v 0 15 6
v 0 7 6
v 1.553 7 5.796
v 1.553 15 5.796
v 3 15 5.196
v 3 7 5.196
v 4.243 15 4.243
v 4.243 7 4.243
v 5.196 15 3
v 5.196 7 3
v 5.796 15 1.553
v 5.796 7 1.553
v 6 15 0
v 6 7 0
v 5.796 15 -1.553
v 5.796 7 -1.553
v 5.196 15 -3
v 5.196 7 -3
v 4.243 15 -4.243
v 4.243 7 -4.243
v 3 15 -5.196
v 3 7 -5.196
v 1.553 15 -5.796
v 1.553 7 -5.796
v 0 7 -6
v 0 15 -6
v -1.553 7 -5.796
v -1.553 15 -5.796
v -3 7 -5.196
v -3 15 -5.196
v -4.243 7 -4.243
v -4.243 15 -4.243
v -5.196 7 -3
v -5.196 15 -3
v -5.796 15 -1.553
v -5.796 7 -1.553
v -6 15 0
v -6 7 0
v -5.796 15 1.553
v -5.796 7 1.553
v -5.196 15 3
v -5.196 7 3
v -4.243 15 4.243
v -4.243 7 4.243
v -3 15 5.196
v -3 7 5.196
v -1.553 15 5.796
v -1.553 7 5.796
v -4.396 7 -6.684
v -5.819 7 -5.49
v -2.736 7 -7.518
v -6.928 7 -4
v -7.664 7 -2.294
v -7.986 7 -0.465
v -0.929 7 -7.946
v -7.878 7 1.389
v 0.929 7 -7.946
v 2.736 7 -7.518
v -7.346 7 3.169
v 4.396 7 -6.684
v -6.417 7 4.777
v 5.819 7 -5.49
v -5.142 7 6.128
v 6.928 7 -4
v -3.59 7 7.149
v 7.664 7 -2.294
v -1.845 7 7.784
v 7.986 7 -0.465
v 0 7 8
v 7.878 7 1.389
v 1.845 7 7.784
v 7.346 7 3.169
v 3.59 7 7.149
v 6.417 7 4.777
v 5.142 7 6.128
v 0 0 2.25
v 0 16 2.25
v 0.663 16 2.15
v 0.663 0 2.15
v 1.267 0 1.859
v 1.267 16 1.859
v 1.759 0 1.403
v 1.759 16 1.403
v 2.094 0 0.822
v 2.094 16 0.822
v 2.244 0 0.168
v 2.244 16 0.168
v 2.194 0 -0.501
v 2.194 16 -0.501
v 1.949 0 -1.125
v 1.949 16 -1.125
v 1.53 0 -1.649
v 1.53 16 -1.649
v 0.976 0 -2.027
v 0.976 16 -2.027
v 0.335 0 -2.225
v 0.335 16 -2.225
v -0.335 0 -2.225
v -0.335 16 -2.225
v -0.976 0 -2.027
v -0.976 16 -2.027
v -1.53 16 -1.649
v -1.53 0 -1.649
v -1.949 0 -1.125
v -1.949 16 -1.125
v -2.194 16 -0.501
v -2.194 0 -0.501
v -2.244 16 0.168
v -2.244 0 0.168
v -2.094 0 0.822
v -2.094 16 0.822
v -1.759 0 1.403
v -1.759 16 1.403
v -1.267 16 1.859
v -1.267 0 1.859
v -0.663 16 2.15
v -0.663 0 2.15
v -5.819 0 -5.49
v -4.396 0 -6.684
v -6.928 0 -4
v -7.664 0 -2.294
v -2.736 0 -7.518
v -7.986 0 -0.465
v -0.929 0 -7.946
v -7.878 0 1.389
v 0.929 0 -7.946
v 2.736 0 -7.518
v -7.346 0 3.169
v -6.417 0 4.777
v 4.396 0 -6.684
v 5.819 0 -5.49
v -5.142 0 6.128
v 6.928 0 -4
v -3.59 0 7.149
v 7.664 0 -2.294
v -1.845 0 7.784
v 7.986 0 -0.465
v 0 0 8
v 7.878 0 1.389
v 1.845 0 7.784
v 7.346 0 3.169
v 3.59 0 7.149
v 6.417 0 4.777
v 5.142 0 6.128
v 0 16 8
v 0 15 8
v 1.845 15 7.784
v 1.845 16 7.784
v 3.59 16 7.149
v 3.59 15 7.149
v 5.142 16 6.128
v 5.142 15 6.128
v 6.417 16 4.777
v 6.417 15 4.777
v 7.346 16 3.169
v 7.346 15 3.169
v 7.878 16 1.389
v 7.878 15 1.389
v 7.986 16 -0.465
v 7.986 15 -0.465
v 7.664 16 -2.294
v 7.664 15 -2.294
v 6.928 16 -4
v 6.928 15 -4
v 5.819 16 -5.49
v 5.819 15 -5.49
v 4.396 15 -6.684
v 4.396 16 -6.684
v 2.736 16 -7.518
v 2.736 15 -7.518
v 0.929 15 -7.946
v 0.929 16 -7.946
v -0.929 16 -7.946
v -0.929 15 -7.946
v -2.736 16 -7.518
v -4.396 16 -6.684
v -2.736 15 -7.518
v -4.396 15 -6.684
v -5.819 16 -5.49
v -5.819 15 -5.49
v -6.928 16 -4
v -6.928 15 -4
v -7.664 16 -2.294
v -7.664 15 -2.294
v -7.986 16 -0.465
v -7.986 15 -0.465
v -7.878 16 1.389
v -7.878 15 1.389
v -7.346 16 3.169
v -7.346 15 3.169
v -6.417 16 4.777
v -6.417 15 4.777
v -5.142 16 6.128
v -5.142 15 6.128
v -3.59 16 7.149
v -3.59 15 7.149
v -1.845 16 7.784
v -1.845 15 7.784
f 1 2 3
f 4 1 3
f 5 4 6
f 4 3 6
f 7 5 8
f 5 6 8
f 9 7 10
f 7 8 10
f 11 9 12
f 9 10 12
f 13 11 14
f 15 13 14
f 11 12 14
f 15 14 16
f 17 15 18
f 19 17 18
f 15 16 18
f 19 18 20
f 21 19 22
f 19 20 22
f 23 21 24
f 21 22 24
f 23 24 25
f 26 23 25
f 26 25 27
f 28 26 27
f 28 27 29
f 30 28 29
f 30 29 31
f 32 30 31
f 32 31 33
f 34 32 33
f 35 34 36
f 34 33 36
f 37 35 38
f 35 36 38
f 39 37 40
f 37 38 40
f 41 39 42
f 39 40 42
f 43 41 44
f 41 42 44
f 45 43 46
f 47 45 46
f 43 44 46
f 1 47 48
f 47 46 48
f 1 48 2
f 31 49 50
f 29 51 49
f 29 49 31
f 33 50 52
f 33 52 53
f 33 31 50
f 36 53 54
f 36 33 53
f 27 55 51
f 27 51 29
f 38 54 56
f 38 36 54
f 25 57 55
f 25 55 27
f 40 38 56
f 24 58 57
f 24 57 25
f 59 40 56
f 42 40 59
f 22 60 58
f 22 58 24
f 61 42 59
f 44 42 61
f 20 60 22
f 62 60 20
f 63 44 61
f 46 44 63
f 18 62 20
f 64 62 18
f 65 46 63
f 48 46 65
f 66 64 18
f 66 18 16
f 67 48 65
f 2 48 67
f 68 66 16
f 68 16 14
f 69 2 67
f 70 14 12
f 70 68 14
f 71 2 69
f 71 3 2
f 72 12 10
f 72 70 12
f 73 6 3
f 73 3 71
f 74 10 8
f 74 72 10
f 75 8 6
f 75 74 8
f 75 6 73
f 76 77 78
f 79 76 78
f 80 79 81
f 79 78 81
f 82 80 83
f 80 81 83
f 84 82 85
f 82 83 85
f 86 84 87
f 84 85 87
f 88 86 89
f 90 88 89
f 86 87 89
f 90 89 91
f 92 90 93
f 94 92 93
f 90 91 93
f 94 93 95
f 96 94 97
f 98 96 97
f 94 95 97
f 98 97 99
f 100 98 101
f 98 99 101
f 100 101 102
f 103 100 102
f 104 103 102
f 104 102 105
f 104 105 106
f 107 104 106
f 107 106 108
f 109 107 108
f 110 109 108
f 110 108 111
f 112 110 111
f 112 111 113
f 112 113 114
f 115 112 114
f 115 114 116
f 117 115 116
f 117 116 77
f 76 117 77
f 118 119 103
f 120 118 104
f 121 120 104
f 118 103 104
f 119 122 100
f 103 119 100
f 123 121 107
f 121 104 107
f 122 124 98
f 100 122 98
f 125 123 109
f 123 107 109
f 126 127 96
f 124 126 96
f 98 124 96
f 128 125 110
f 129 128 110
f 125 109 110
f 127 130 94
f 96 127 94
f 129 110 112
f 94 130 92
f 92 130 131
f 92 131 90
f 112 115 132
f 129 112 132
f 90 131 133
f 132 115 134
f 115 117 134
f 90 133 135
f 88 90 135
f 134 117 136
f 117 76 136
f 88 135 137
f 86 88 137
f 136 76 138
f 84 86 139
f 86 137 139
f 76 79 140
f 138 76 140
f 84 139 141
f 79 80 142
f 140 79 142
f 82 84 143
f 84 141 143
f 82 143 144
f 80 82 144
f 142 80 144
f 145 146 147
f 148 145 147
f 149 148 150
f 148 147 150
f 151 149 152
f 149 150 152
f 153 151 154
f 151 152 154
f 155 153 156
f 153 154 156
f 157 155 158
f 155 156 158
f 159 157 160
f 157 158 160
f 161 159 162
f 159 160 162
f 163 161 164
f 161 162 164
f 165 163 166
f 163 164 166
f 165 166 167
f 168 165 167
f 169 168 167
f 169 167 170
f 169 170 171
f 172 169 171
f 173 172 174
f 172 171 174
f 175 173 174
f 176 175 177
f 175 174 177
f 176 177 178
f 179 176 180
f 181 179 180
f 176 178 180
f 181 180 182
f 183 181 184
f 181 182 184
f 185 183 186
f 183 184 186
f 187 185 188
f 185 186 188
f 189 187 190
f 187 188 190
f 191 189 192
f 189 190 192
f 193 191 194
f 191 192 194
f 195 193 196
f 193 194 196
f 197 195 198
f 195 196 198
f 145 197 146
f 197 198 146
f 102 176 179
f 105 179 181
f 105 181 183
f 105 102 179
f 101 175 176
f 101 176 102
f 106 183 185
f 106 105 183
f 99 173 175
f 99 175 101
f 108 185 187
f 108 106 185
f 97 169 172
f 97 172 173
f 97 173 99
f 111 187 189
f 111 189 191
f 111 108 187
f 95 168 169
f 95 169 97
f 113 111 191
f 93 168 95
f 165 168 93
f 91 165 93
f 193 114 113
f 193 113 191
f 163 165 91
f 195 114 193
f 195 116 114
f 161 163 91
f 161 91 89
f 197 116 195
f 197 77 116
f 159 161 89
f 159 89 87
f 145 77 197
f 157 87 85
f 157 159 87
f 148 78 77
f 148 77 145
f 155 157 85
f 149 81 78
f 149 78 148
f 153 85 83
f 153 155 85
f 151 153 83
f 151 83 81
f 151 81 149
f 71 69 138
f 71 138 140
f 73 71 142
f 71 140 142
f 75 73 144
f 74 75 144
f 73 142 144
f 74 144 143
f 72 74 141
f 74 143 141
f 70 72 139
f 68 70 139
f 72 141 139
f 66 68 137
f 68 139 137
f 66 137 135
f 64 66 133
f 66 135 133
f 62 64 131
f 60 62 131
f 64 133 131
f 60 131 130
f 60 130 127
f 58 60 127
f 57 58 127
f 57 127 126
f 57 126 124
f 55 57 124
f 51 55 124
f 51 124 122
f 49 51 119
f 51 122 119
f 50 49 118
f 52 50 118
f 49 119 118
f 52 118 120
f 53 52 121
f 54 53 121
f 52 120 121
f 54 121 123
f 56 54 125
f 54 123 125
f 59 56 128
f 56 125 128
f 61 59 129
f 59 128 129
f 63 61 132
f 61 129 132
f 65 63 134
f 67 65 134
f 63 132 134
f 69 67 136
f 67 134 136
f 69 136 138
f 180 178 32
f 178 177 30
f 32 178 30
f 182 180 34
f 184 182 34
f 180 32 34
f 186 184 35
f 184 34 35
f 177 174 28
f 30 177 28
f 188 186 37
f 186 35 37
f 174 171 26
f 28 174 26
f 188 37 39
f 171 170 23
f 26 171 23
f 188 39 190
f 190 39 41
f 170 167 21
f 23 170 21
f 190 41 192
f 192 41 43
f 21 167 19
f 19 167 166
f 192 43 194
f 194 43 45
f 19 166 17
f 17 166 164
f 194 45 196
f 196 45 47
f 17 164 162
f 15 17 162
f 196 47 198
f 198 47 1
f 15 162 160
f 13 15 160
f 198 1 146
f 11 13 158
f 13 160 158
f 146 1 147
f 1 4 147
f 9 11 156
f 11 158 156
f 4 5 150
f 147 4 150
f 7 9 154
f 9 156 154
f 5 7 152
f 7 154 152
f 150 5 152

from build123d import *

# Parameters (mm, degrees)
SKETCH1_R           = 8
BOSS_EXTRUDE1_DEPTH = 7
SKETCH2_R           = 6
BOSS_EXTRUDE2_DEPTH = 8
SKETCH3_R           = 8
BOSS_EXTRUDE3_DEPTH = 1
CUT_EXTRUDE1_REACH  = 21.596
SKETCH4_R           = 2.25


with BuildPart() as part:
    # Sketch1 → Boss-Extrude1 (new body)
    with BuildSketch(Plane(origin=(0, 0, 0), x_dir=(1, 0, 0), z_dir=(0, 1, 0))):
        with Locations(Location((0, 0, 0), (0, 0, 270))):
            Circle(SKETCH1_R)
    extrude(amount=BOSS_EXTRUDE1_DEPTH)

    # Sketch2 → Boss-Extrude2 (add)
    with BuildSketch(Plane(origin=(0, 7, 0), x_dir=(1, 0, 0), z_dir=(0, 1, 0))):
        with Locations(Location((0, 0, 0), (0, 0, 270))):
            Circle(SKETCH2_R)
    extrude(amount=BOSS_EXTRUDE2_DEPTH)

    # Sketch3 → Boss-Extrude3 (add)
    with BuildSketch(Plane(origin=(0, 15, 0), x_dir=(1, 0, 0), z_dir=(0, 1, 0))):
        with Locations(Location((0, 0, 0), (0, 0, 270))):
            Circle(SKETCH3_R)
    extrude(amount=BOSS_EXTRUDE3_DEPTH)

    # Sketch4 → Cut-Extrude1 (cut, up to next)
    with BuildSketch(Plane(origin=(0, 16, 0), x_dir=(1, 0, 0), z_dir=(0, 1, 0)), mode=Mode.PRIVATE) as cut_extrude1_sk1:
        with Locations(Location((0, 0, 0), (0, 0, 270))):
            Circle(SKETCH4_R)
    cut_extrude1_tool1 = extrude(cut_extrude1_sk1.sketch, amount=-CUT_EXTRUDE1_REACH, mode=Mode.PRIVATE) & part.part
    add(cut_extrude1_tool1.solids().sort_by_distance((0, 16, 0))[0], mode=Mode.SUBTRACT)


solid = part.part
